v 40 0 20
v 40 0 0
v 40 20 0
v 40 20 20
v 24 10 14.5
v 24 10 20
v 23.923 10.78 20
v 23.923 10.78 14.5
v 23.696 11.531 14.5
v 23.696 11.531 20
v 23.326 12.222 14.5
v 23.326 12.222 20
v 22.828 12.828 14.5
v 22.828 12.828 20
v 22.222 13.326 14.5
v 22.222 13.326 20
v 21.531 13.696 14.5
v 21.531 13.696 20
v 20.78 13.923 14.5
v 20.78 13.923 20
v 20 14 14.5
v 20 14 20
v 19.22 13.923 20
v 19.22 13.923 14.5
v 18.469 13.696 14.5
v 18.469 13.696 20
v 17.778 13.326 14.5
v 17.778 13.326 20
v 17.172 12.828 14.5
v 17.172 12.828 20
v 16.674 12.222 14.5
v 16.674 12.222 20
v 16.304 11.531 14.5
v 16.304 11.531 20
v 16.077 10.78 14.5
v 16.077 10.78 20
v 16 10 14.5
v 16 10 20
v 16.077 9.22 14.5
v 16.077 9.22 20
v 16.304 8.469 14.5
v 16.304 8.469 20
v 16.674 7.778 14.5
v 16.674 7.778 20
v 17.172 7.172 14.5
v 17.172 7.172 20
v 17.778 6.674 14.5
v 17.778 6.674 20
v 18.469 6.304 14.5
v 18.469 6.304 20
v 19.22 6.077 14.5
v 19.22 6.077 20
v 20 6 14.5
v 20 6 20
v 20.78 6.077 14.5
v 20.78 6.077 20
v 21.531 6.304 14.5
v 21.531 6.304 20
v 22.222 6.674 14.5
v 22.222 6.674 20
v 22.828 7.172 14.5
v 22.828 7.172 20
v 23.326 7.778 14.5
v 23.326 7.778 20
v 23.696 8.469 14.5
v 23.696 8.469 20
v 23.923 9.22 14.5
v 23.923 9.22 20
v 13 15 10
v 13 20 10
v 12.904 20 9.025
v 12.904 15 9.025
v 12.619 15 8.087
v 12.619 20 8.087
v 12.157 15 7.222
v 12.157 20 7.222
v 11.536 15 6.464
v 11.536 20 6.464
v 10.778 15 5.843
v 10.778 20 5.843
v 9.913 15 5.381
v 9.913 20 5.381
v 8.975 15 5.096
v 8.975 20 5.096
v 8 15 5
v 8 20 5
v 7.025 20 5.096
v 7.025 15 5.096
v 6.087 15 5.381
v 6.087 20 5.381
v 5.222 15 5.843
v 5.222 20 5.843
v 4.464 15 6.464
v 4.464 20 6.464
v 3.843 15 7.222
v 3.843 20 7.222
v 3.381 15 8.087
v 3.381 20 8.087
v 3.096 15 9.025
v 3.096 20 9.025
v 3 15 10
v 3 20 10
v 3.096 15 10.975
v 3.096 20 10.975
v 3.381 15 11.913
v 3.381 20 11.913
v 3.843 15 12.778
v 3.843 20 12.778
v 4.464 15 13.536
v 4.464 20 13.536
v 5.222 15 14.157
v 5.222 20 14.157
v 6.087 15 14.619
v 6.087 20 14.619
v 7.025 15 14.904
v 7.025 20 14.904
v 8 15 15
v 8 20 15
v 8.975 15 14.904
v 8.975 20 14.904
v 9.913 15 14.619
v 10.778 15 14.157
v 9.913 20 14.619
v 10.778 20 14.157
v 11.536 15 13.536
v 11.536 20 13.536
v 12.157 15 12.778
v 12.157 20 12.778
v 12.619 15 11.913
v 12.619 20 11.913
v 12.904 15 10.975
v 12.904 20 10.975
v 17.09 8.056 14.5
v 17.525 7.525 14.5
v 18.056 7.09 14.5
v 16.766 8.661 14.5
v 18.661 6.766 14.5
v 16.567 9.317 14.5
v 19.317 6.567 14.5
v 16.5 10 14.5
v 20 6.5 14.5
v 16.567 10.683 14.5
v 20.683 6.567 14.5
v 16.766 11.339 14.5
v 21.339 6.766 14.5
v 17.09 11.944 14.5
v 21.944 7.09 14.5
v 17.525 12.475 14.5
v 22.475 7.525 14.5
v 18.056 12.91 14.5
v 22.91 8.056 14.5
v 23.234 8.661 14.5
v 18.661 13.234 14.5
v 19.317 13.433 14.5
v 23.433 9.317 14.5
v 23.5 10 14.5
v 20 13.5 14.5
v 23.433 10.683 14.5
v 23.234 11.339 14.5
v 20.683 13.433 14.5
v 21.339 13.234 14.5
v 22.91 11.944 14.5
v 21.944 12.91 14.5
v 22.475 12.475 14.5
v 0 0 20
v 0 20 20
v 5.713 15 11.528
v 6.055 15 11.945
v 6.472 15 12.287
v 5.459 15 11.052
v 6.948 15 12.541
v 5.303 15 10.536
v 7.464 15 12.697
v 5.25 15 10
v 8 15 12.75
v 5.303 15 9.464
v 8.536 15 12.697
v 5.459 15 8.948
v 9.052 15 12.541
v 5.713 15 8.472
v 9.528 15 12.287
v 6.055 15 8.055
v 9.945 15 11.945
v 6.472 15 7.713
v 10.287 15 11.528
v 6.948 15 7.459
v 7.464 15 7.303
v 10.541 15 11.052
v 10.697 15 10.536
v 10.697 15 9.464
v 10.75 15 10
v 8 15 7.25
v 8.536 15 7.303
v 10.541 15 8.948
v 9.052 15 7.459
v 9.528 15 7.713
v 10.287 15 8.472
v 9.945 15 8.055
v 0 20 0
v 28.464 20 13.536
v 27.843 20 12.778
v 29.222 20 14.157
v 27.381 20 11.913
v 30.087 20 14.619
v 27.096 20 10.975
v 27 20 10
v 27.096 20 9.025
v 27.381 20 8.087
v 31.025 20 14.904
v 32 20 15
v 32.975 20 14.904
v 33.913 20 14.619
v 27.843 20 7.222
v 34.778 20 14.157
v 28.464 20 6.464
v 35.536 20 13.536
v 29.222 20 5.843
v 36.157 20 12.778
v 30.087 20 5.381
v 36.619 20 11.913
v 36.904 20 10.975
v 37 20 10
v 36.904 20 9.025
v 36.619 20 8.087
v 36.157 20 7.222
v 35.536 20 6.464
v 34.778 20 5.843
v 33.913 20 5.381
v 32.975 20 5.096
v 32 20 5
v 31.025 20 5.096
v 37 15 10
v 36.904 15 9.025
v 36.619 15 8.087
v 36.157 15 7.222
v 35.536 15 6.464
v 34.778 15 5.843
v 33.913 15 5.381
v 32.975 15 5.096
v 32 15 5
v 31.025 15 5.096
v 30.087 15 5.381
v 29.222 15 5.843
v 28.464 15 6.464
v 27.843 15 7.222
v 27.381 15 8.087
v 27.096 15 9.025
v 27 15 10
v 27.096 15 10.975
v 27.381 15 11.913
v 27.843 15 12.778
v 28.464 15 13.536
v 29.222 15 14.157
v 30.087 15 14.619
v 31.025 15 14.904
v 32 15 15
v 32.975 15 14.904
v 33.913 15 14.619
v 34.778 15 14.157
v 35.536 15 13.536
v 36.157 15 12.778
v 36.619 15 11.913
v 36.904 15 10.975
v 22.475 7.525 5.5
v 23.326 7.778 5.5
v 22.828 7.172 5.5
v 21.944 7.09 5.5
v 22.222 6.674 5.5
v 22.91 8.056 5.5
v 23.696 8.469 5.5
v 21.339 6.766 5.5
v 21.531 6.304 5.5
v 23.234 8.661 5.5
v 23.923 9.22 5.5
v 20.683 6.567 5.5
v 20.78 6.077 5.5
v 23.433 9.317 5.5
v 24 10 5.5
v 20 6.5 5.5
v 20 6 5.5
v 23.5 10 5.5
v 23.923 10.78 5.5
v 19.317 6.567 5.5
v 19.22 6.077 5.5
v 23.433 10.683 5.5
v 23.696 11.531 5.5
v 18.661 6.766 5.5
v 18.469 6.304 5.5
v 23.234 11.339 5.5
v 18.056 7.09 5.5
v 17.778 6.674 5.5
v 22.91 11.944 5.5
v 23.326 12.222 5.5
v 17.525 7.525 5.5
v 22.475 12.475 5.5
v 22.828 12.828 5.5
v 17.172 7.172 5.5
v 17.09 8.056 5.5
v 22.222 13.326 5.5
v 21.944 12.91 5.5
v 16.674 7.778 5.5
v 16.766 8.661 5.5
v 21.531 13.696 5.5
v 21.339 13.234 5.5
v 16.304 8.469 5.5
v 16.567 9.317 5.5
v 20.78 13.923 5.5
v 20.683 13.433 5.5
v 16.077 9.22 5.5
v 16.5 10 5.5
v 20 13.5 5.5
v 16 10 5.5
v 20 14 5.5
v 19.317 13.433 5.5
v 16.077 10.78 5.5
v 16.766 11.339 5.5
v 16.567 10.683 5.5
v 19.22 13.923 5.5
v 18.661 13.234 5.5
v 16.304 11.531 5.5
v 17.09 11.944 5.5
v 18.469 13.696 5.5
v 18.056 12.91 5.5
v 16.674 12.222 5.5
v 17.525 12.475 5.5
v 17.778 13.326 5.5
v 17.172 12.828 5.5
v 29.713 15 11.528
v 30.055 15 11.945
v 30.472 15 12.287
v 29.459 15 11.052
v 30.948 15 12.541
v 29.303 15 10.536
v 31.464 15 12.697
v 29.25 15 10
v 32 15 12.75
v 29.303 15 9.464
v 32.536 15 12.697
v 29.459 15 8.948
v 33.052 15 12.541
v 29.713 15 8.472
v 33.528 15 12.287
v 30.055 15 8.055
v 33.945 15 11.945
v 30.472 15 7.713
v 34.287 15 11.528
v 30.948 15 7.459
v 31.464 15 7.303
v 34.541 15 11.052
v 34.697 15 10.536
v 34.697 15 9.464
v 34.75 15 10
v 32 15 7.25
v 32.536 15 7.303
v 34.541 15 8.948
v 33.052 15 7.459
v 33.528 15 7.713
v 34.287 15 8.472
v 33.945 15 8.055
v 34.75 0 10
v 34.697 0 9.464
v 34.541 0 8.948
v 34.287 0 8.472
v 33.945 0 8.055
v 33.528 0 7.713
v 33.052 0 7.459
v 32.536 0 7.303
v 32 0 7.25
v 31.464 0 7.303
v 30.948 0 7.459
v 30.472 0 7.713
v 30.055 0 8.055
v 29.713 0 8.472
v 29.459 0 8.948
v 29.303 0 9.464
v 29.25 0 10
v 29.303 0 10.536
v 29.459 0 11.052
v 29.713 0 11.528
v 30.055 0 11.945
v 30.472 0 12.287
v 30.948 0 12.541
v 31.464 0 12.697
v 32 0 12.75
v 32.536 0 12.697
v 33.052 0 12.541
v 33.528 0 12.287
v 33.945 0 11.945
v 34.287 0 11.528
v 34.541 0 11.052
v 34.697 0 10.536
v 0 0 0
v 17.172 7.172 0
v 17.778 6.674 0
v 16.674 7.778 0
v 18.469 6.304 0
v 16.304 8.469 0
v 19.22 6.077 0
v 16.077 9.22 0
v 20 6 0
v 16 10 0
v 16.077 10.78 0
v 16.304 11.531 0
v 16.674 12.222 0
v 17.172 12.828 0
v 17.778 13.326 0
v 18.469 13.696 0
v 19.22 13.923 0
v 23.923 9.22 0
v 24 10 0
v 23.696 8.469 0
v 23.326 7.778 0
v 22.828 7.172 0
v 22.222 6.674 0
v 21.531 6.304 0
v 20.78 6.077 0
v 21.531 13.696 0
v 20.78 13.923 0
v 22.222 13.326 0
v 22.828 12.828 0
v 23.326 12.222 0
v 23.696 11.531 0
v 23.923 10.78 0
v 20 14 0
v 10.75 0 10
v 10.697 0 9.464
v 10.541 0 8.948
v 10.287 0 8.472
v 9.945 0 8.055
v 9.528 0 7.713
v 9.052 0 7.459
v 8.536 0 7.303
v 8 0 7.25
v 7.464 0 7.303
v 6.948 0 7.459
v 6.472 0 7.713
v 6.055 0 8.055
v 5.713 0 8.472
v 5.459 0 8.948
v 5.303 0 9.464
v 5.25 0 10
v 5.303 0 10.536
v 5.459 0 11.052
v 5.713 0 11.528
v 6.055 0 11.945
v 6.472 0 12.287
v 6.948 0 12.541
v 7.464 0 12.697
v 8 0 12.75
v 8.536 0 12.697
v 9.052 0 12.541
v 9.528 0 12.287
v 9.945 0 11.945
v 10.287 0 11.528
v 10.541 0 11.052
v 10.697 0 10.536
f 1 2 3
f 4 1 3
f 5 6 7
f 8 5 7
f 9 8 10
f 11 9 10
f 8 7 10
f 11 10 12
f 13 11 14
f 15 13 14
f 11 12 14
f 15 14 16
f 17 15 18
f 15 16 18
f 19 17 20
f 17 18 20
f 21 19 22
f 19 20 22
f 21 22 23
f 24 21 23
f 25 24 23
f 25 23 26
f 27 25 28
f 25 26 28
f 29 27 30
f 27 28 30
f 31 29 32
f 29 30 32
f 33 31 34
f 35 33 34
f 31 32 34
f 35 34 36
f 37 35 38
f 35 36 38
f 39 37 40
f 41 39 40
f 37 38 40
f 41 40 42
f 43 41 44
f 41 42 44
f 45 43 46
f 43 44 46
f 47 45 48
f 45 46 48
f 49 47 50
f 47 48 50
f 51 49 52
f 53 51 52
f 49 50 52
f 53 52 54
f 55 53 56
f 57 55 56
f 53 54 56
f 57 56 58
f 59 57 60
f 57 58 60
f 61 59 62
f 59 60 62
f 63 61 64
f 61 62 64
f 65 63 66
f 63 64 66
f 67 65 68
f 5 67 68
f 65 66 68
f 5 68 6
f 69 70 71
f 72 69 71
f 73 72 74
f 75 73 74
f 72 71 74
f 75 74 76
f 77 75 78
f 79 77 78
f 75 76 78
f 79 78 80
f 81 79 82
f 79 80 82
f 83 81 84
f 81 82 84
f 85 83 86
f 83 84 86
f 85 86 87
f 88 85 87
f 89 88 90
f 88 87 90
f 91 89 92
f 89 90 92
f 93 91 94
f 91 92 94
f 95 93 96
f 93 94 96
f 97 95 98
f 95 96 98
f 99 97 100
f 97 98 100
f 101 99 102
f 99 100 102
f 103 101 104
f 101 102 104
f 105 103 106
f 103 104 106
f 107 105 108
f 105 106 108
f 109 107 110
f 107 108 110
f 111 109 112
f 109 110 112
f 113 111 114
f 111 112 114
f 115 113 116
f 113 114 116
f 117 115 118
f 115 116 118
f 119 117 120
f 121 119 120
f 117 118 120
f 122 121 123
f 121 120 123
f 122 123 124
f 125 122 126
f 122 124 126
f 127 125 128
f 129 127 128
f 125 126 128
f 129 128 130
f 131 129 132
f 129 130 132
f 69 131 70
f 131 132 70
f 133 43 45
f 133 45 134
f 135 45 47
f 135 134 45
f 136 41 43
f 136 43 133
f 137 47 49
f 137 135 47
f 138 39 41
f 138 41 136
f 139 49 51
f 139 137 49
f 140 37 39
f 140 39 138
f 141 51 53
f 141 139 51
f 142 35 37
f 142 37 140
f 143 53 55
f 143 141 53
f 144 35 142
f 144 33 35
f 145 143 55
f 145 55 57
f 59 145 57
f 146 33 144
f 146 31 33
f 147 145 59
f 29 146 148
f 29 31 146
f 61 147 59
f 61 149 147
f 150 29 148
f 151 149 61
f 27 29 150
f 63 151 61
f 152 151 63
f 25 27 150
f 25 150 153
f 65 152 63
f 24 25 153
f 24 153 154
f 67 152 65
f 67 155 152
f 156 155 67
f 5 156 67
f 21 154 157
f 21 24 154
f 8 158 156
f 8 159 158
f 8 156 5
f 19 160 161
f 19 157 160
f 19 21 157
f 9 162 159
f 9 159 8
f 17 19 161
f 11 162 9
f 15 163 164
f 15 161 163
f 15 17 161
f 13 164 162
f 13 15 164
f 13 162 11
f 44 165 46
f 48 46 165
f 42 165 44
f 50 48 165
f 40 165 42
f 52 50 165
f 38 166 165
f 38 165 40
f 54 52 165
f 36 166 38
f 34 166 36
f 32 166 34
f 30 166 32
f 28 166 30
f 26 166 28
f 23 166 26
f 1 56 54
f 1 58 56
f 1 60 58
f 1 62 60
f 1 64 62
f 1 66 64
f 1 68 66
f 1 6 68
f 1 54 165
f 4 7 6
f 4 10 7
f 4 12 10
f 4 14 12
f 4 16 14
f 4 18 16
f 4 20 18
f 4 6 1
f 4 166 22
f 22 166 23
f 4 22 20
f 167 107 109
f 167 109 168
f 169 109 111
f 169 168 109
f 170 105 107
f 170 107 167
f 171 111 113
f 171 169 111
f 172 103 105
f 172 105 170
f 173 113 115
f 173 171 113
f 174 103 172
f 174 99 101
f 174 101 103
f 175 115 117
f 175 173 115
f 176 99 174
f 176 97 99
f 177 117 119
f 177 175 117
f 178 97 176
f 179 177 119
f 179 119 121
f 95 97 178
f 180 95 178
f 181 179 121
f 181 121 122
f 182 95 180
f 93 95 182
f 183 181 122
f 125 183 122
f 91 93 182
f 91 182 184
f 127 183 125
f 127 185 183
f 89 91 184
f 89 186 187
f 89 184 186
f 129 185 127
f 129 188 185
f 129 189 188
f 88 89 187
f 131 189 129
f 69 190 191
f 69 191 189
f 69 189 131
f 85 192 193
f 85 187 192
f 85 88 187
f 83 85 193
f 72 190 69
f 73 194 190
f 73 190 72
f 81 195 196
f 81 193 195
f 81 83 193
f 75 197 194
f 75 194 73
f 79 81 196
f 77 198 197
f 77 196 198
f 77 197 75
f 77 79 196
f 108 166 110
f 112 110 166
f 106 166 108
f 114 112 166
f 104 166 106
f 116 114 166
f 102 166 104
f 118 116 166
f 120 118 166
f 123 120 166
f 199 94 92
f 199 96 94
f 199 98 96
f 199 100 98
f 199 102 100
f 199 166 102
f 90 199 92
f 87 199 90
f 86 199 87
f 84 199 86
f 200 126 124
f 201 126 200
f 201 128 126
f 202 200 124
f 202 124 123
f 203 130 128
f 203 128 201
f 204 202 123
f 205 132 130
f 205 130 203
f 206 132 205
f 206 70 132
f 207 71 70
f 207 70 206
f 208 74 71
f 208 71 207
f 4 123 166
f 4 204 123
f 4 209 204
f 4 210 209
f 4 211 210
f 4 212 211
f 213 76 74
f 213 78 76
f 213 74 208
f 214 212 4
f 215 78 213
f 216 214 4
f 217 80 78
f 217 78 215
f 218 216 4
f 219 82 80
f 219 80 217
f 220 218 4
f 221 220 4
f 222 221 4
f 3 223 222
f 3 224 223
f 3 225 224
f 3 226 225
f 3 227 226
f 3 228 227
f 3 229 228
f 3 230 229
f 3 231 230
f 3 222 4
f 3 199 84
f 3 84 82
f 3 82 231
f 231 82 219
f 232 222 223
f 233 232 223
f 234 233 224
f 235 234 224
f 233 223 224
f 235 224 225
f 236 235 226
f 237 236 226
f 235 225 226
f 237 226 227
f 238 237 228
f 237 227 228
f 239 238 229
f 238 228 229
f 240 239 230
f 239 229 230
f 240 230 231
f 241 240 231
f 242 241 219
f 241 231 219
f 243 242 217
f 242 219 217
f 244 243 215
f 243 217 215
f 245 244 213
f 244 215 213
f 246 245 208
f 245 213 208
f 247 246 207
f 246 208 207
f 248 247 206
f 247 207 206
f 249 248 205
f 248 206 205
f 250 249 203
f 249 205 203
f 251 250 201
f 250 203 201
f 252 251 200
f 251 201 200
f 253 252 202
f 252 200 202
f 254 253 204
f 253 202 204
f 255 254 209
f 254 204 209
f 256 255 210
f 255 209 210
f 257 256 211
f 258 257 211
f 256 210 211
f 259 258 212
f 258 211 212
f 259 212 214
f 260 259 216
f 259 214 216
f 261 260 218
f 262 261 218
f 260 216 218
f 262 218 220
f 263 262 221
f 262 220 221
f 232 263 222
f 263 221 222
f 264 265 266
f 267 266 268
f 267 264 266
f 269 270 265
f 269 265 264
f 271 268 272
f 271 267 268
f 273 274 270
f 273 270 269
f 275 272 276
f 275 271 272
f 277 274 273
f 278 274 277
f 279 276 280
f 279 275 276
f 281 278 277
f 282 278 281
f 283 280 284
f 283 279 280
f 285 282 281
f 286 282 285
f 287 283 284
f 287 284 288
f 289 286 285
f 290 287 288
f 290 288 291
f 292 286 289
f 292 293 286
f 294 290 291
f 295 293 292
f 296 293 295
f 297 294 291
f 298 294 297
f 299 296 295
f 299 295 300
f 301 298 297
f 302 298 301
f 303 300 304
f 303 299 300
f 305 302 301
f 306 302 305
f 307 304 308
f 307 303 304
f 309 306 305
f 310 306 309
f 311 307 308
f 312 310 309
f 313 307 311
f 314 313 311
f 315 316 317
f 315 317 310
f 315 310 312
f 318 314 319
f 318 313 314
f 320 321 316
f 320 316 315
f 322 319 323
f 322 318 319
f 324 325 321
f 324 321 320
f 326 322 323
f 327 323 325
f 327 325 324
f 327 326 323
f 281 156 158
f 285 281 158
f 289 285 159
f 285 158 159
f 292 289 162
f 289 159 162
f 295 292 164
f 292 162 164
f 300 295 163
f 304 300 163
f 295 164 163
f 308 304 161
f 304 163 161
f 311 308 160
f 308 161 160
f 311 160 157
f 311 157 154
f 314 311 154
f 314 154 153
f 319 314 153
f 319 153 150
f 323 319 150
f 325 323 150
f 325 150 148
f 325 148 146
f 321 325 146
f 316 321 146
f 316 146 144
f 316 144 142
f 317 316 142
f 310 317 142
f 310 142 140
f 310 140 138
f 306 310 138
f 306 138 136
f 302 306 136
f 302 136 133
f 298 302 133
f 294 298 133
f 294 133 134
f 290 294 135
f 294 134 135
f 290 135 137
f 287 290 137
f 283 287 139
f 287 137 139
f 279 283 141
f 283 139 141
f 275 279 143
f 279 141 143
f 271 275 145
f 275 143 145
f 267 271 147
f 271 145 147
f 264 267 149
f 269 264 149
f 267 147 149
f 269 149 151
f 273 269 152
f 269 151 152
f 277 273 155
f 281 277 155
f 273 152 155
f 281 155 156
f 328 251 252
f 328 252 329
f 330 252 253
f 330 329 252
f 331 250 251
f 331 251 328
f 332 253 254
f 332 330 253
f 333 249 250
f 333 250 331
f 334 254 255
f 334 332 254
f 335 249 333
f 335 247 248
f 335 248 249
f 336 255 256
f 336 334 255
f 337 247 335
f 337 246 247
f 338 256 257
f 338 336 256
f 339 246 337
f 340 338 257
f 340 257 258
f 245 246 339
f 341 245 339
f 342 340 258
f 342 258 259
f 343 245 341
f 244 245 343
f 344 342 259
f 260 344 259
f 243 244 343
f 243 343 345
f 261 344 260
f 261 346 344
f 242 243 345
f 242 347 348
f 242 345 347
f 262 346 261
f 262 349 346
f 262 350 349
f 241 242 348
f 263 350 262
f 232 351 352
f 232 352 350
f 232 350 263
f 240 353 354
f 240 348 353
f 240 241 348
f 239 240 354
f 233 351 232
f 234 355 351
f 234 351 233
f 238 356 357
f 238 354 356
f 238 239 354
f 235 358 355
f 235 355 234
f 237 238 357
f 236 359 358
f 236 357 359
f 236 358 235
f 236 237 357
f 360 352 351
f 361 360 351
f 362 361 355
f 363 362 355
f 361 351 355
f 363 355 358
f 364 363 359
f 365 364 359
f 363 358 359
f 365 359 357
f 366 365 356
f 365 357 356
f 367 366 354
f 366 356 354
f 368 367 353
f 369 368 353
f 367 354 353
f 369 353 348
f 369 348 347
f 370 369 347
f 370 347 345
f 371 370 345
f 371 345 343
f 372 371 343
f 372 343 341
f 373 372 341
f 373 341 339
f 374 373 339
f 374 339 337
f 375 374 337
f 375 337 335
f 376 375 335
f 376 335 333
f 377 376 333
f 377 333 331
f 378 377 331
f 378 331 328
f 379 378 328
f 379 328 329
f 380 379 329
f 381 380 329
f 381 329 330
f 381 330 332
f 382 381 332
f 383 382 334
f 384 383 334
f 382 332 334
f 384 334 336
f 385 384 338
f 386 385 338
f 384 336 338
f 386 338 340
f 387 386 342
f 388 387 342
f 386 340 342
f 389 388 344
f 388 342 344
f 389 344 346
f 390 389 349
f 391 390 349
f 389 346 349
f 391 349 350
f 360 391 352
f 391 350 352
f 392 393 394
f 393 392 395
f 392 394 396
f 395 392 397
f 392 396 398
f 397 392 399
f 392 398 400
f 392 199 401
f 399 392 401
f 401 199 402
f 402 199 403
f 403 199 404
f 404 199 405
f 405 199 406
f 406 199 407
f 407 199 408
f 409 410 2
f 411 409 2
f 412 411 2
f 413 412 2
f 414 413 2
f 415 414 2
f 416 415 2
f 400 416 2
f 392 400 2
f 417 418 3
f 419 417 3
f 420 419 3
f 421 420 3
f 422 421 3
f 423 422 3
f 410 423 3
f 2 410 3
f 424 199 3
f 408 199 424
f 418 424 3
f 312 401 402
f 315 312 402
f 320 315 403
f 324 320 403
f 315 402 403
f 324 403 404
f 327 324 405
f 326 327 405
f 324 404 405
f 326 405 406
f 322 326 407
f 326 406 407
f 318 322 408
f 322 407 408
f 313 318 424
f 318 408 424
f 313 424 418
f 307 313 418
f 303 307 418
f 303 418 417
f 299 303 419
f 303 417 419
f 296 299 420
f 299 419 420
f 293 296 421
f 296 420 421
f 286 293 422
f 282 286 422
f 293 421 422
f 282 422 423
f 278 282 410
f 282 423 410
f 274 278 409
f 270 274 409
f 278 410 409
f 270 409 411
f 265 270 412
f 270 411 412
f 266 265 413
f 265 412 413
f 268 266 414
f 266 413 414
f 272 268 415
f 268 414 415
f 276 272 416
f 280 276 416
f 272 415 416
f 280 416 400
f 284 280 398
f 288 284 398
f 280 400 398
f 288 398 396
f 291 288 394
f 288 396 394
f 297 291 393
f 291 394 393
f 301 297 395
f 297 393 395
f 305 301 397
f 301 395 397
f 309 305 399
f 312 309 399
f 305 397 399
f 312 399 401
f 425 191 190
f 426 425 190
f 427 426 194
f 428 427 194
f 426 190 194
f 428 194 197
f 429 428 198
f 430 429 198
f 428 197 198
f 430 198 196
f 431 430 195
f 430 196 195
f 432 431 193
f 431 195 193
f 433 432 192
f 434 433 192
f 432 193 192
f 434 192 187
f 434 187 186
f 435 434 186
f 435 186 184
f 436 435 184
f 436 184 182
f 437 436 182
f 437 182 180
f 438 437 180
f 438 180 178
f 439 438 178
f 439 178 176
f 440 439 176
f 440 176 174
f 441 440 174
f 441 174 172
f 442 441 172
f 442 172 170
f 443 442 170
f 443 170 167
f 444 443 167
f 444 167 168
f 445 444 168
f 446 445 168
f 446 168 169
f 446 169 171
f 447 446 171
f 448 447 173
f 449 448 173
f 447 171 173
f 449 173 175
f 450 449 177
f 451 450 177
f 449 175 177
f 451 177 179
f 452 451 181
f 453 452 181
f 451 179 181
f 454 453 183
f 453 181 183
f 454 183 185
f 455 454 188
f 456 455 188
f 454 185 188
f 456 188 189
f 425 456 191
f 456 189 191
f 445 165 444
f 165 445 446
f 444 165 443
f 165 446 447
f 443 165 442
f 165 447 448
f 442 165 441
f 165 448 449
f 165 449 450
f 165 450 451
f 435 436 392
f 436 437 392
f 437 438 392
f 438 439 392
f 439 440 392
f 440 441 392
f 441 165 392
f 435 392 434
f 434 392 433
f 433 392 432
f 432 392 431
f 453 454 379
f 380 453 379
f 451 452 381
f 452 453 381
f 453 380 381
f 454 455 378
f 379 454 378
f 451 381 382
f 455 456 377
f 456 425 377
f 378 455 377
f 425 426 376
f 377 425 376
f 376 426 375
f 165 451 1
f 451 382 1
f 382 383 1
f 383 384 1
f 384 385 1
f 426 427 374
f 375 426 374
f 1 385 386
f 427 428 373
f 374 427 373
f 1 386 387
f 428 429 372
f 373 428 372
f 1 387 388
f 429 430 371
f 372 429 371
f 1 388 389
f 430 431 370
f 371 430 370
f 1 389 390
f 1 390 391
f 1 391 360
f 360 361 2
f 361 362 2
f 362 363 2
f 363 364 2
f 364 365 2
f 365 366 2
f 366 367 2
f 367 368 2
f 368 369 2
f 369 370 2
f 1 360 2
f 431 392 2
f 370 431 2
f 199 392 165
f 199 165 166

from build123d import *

# Parameters (mm, degrees)
SKETCH1_W           = 40
SKETCH1_H           = 20
BOSS_EXTRUDE1_DEPTH = 20
SKETCH2_R           = 2.75
CUT_EXTRUDE1_DEPTH  = 21
SKETCH3_R           = 5
CUT_EXTRUDE2_DEPTH  = 5
SKETCH4_R           = 4
CUT_EXTRUDE3_DEPTH  = 5.5
SKETCH5_R           = 4
CUT_EXTRUDE4_DEPTH  = 5.5
SKETCH6_R           = 3.5
CUT_EXTRUDE5_DEPTH  = 15.5


with BuildPart() as part:
    # Sketch1 → Boss-Extrude1 (new body)
    with BuildSketch(Plane.XY):
        with Locations((20, 10)):
            Rectangle(SKETCH1_W, SKETCH1_H)
    extrude(amount=BOSS_EXTRUDE1_DEPTH)

    # Sketch2 → Cut-Extrude1 (cut, through all)
    with BuildSketch(Plane(origin=(0, 20, 0), x_dir=(1, 0, 0), z_dir=(0, 1, 0))):
        with Locations((8, -10)):
            Circle(SKETCH2_R)
        with Locations((32, -10)):
            Circle(SKETCH2_R)
    extrude(amount=-CUT_EXTRUDE1_DEPTH, mode=Mode.SUBTRACT)

    # Sketch3 → Cut-Extrude2 (cut)
    with BuildSketch(Plane(origin=(0, 20, 0), x_dir=(1, 0, 0), z_dir=(0, 1, 0))):
        with Locations((8, -10)):
            Circle(SKETCH3_R)
        with Locations((32, -10)):
            Circle(SKETCH3_R)
    extrude(amount=-CUT_EXTRUDE2_DEPTH, mode=Mode.SUBTRACT)

    # Sketch4 → Cut-Extrude3 (cut)
    with BuildSketch(Plane.XY.offset(20)):
        with Locations((20, 10)):
            Circle(SKETCH4_R)
    extrude(amount=-CUT_EXTRUDE3_DEPTH, mode=Mode.SUBTRACT)

    # Sketch5 → Cut-Extrude4 (cut)
    with BuildSketch(Plane(origin=(0, 0, 0), x_dir=(-1, 0, 0), z_dir=(0, 0, -1))):
        with Locations((-20, 10)):
            Circle(SKETCH5_R)
    extrude(amount=-CUT_EXTRUDE4_DEPTH, mode=Mode.SUBTRACT)

    # Sketch6 → Cut-Extrude5 (cut, through all)
    with BuildSketch(Plane.XY.offset(14.5)):
        with Locations((20, 10)):
            Circle(SKETCH6_R)
    extrude(amount=-CUT_EXTRUDE5_DEPTH, mode=Mode.SUBTRACT)


solid = part.part
